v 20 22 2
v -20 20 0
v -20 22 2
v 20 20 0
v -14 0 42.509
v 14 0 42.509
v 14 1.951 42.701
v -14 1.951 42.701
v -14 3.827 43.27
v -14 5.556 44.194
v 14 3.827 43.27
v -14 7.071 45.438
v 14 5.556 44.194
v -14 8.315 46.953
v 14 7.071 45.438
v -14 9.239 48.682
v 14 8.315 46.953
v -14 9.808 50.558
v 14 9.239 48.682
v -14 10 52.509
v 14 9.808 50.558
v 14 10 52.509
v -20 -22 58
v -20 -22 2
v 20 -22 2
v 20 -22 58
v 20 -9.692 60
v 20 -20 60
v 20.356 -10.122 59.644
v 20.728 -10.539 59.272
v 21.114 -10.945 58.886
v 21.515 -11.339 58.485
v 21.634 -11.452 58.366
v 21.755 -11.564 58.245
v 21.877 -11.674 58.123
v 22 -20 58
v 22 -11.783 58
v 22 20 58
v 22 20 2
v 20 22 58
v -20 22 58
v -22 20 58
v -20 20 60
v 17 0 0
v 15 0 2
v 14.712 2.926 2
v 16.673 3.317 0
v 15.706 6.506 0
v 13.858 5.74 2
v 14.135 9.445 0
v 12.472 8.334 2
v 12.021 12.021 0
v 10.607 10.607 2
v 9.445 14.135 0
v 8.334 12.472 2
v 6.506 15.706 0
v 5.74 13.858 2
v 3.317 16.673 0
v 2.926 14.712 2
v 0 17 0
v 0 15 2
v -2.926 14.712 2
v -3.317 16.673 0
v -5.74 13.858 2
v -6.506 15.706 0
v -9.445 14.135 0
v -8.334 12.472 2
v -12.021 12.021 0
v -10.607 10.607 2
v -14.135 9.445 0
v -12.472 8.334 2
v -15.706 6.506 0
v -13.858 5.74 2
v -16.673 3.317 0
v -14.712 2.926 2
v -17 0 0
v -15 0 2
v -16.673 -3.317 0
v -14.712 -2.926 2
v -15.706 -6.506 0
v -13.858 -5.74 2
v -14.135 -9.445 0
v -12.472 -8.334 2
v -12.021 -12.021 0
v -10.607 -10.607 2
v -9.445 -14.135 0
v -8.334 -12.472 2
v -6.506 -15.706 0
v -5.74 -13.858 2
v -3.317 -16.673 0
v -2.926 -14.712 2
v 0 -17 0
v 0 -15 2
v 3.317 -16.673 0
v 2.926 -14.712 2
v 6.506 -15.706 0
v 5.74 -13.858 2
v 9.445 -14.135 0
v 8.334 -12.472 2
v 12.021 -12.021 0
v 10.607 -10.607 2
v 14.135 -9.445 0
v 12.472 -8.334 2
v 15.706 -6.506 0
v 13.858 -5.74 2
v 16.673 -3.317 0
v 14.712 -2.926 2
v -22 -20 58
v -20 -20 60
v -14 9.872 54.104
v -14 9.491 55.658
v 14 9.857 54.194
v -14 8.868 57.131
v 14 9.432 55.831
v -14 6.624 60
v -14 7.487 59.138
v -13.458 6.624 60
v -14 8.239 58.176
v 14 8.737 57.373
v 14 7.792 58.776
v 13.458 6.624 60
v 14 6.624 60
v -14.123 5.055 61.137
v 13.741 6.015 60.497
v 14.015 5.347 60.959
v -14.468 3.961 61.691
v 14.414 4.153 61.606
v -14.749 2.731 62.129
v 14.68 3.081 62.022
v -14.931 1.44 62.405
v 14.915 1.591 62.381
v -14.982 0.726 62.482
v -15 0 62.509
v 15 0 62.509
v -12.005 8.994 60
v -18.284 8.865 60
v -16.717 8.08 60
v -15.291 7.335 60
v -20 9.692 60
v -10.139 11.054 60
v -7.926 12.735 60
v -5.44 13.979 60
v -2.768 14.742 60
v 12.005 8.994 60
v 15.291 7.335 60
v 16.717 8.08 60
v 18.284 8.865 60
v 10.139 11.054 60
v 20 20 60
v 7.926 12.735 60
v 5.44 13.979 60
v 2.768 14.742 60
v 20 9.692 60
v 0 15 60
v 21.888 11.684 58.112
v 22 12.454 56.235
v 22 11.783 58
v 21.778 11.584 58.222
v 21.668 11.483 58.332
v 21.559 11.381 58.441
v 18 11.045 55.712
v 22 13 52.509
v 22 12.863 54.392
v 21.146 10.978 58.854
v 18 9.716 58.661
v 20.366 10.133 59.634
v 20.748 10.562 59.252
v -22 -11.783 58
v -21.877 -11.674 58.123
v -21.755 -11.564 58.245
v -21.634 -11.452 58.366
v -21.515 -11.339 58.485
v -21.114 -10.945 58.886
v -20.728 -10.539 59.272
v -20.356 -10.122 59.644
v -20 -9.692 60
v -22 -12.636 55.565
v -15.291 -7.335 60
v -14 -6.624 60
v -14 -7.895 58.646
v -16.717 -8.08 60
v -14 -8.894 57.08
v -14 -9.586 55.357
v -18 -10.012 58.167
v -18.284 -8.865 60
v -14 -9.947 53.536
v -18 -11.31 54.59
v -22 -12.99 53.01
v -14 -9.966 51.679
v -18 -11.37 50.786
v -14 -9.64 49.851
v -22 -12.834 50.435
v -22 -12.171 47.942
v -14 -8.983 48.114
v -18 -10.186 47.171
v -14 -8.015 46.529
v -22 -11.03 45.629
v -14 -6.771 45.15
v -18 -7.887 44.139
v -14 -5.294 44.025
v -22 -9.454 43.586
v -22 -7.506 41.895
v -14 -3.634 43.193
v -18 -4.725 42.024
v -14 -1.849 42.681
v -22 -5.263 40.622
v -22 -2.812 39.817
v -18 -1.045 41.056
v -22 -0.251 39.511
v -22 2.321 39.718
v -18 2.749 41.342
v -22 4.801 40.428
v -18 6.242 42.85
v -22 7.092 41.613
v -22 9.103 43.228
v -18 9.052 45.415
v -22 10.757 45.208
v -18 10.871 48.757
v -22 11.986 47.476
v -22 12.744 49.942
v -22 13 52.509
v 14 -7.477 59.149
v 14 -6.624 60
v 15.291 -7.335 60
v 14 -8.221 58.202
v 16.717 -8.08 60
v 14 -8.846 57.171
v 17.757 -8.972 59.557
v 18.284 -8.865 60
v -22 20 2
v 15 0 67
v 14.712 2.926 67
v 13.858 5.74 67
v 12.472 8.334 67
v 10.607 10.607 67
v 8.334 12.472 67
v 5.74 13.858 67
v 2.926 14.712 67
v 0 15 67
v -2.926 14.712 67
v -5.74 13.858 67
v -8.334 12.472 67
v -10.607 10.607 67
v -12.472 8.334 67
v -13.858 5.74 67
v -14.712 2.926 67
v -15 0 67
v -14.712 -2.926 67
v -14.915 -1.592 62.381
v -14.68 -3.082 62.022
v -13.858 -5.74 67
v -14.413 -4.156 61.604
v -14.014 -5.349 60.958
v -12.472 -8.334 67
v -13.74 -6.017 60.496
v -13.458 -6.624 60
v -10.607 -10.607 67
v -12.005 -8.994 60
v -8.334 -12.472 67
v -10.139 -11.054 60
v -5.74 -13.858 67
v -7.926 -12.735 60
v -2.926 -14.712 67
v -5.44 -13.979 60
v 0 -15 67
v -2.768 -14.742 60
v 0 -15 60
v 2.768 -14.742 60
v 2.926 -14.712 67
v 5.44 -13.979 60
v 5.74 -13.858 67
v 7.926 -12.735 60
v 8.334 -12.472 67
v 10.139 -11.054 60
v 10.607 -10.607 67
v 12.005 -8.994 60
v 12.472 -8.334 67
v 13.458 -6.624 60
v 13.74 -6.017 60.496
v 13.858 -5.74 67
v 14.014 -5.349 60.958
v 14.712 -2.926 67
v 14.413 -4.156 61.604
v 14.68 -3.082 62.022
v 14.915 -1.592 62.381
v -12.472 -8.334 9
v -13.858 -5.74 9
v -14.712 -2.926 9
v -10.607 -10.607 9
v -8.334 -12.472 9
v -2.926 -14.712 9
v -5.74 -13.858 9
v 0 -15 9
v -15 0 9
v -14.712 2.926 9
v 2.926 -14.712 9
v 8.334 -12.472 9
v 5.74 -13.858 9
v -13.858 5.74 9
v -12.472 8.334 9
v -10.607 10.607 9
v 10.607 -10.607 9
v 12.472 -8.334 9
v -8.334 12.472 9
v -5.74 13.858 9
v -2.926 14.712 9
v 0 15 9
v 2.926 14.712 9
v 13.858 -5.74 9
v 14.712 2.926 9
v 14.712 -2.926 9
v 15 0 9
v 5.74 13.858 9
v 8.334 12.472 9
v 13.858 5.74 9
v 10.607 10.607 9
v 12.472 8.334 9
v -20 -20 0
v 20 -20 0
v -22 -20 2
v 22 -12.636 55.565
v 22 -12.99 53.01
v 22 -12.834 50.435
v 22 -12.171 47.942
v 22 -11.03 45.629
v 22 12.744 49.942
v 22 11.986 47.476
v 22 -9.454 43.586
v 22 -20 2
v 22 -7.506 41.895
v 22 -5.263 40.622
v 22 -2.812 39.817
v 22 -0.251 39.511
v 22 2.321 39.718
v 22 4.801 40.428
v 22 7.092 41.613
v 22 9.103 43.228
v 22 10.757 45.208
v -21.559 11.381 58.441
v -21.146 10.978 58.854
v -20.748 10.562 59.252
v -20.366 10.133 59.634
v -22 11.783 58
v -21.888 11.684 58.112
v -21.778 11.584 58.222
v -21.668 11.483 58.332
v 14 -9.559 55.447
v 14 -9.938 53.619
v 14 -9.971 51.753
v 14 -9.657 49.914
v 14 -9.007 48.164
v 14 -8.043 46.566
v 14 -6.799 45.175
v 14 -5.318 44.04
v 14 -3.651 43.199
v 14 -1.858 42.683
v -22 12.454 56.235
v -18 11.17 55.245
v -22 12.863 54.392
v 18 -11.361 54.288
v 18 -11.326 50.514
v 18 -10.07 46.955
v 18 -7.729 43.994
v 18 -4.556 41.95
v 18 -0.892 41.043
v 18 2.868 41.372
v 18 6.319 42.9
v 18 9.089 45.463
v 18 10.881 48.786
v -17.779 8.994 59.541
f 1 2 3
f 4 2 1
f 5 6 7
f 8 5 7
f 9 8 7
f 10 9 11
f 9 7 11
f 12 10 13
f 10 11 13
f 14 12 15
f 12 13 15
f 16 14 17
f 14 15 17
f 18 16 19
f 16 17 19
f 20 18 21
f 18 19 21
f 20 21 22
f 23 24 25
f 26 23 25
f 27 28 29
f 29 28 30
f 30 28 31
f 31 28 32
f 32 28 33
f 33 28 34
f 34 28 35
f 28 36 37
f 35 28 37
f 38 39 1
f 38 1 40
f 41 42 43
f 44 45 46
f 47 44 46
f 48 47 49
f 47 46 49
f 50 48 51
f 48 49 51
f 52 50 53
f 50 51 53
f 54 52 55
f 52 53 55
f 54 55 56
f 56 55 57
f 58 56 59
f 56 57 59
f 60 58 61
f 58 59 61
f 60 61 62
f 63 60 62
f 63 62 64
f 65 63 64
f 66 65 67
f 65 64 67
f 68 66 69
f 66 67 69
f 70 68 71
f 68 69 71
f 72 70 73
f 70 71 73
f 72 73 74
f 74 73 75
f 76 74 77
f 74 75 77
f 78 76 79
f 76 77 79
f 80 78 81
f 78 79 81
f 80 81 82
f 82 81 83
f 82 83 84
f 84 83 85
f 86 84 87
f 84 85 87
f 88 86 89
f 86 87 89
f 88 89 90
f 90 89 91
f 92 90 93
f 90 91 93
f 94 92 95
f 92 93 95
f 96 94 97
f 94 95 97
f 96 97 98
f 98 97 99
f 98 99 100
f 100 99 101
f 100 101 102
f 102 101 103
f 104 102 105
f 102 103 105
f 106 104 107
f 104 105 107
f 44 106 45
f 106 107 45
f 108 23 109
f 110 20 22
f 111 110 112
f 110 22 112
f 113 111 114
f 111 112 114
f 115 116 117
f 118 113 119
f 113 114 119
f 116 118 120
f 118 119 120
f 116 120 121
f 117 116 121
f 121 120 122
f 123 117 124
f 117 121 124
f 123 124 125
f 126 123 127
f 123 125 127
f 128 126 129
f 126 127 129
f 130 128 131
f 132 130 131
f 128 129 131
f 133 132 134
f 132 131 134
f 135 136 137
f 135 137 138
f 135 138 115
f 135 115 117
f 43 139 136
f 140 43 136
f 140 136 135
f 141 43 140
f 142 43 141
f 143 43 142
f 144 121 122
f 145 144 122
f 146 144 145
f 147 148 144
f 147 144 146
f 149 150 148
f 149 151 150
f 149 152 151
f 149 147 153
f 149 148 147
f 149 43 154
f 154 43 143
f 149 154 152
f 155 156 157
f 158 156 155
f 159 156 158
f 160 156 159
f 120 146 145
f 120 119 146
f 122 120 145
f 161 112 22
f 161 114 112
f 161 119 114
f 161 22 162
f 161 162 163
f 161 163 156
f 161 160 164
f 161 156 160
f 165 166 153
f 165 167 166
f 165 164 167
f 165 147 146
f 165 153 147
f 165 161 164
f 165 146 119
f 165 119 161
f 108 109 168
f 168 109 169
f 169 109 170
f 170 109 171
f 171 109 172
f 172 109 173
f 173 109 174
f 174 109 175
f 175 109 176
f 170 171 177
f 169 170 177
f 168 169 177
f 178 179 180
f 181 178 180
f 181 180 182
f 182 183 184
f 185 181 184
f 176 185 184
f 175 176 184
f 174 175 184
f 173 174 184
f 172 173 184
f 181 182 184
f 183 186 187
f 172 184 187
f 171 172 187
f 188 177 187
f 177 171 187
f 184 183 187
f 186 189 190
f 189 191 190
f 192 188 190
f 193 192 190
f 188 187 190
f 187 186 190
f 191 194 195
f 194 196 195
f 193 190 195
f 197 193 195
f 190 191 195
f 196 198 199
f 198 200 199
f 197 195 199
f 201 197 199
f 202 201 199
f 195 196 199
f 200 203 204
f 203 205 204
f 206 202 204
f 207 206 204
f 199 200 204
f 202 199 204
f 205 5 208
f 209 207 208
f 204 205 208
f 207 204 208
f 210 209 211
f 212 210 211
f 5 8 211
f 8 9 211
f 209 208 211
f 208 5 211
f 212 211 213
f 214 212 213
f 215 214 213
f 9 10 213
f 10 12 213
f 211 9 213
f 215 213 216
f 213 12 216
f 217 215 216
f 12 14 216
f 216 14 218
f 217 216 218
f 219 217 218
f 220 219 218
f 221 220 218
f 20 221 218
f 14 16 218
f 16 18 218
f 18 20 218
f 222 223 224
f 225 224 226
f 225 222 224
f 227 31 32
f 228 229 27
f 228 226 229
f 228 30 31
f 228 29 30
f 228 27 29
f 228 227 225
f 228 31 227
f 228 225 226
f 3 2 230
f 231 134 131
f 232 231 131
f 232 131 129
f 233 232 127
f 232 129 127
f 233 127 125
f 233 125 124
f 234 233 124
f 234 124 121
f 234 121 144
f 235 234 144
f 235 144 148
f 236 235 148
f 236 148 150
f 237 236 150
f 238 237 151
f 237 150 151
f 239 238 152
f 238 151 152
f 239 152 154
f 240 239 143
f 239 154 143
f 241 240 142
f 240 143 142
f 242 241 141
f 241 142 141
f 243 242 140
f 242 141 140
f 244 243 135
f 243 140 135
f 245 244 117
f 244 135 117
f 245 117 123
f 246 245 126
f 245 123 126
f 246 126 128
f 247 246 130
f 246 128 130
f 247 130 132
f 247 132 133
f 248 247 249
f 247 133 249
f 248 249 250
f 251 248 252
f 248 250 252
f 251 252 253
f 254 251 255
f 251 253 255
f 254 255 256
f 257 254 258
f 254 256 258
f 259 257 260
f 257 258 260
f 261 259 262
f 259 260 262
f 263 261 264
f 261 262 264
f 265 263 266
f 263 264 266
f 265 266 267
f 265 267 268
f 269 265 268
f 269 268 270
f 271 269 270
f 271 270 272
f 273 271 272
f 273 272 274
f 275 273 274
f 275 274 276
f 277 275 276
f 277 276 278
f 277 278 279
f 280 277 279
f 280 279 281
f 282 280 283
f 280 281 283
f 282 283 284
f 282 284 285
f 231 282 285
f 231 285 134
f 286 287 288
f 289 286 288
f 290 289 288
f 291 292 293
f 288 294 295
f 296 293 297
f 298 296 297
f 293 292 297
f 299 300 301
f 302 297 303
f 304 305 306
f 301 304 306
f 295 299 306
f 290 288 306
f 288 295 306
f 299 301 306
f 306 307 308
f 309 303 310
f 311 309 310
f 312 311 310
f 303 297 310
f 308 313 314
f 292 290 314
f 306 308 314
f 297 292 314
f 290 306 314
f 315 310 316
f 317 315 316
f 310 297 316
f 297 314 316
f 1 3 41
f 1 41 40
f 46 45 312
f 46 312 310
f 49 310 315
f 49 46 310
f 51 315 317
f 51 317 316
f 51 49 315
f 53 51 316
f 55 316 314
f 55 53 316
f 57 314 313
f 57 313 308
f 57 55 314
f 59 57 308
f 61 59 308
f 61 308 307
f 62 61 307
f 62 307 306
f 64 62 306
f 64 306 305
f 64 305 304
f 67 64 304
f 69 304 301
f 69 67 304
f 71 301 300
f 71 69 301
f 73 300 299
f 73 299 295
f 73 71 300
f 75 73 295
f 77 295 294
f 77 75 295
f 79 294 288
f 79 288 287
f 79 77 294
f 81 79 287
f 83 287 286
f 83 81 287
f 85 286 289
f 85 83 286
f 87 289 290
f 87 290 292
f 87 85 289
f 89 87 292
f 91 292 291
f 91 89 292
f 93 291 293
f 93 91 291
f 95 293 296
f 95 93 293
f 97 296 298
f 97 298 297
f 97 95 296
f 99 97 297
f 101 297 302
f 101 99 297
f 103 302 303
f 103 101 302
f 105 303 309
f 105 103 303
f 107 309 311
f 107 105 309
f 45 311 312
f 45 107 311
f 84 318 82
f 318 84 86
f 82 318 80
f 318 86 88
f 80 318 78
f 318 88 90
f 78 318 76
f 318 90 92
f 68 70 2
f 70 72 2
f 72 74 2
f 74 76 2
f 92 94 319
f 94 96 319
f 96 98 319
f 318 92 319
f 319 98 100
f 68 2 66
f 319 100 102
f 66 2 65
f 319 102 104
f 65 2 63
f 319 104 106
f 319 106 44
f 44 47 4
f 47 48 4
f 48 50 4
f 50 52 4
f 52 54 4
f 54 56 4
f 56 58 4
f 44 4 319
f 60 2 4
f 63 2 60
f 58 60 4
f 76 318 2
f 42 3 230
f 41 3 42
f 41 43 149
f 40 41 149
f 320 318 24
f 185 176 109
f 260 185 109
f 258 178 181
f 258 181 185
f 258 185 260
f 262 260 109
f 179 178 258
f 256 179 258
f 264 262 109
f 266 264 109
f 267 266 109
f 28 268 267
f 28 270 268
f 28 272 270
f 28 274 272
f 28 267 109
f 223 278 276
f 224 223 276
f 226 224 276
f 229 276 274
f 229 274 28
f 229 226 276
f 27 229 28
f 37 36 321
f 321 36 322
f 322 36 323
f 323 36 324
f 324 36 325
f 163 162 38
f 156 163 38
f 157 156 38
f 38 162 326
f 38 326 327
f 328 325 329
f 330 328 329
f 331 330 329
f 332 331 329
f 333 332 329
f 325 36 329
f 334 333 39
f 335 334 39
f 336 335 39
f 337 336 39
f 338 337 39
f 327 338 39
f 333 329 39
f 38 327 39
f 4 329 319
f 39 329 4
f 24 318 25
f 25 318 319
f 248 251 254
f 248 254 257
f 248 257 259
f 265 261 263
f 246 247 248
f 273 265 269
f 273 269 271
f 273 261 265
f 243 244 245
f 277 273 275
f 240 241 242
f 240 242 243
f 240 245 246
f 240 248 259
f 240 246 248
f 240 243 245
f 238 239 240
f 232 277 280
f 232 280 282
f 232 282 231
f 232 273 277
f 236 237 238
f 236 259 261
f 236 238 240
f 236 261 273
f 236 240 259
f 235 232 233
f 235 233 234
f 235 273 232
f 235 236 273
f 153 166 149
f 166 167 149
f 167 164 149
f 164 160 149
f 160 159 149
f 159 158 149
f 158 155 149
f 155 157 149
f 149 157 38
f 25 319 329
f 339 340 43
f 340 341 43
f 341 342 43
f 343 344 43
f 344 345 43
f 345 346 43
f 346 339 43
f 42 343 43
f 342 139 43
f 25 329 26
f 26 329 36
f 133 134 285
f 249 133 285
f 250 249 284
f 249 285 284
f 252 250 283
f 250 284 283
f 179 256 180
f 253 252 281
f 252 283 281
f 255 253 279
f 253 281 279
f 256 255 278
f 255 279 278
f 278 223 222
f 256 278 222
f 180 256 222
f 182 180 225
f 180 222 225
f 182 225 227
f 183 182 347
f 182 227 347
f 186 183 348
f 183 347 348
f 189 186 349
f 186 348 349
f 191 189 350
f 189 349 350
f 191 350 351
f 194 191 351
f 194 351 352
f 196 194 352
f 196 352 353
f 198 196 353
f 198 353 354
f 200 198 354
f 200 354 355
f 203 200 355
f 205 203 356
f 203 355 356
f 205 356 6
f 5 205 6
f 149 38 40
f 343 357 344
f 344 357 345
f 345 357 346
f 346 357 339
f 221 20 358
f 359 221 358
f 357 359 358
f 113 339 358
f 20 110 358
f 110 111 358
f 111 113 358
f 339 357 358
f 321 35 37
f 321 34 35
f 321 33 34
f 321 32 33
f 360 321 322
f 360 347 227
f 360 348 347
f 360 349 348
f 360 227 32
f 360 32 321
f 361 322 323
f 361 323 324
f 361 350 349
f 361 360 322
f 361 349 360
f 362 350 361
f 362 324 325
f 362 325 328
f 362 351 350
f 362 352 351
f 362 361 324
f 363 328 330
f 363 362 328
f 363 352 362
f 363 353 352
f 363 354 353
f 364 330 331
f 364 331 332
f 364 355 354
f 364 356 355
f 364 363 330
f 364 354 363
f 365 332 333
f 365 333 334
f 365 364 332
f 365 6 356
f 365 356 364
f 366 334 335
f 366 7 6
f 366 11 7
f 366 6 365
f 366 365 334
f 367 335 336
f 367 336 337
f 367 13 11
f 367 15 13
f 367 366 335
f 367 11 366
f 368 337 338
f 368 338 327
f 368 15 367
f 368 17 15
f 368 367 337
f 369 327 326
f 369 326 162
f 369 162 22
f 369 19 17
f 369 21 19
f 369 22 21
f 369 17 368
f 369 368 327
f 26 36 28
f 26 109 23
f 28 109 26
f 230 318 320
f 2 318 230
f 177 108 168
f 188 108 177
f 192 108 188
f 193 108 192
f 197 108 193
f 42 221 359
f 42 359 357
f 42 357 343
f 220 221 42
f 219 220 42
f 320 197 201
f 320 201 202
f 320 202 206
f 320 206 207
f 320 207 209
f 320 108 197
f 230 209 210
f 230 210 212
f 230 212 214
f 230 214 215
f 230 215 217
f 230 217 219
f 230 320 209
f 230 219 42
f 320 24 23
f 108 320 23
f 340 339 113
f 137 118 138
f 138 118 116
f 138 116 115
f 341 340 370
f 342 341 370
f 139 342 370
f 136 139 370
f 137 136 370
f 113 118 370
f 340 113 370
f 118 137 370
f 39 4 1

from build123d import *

# Parameters (mm, degrees)
F2_W          = 44
F2_H          = 44
F2_R          = 15
F2_R_2        = 10
F3_DEPTH      = 60
F4_R          = 15
F4_R_2        = 10
F5_DEPTH      = 7
F6_DEPTH      = 9
F8_SIZE       = 2
F11_DEPTH     = 60
F12_T4_ANGLE  = 332.4696617
F12_T9_ANGLE  = 152.2075678766
F12_T14_ANGLE = 152.2075678766
F12_T19_ANGLE = 332.4696617


# Not quite as in the source:
# - a fillet or chamfer that OpenCascade refuses, or shapes differently, is made with other operations: its cross-section is extruded or revolved along the edge and cut away or added


with BuildPart() as f3:
    # F2 (on Top) → F3 (new body)
    with BuildSketch(Plane.XY):
        Rectangle(F2_W, F2_H)
        Circle(F2_R, mode=Mode.SUBTRACT)
        Circle(F2_R)
        Circle(F2_R_2, mode=Mode.SUBTRACT)
        Circle(F2_R_2)
    extrude(amount=F3_DEPTH)

    # F4 (on face) → F5 (join)
    with BuildSketch(Plane.XY.offset(60)):
        Circle(F4_R)
        Circle(F4_R_2, mode=Mode.SUBTRACT)
        Circle(F4_R_2)
    extrude(amount=F5_DEPTH)

    # F2 (on Top) → F6 (cut)
    with BuildSketch(Plane.XY):
        Circle(F2_R)
        Circle(F2_R_2, mode=Mode.SUBTRACT)
        Circle(F2_R_2)
    extrude(amount=F6_DEPTH, mode=Mode.SUBTRACT)

    # F8
    f8_edges = [f3.edges().sort_by_distance(p)[0] for p in [
        (0, -22, 0),
        (22, 0, 0),
        (-22, 0, 0),
        (0, 22, 0),
        (-22, -22, 30),
        (-22, 22, 30),
        (22, 22, 30),
        (22, -22, 30),
        (22, 0, 60),
        (0, -22, 60),
        (-22, 0, 60),
        (0, 22, 60),
        (-15, 0, 0),
    ]]
    chamfer(f8_edges, length=F8_SIZE)

    # F10 (on offset) → F11 (cut)
    with BuildSketch(Plane.YZ.offset(22)):
        with BuildLine():
            ThreePointArc((10, 52.5087859035), (7.0710678119, 59.5798537153), (0, 62.5087859035))
            Line((0, 62.5087859035), (0, 42.5087859035))
            ThreePointArc((0, 42.5087859035), (7.0710678119, 45.4377180916), (10, 52.5087859035))
        make_face()
        with BuildLine():
            Line((0, 42.5087859035), (0, 62.5087859035))
            ThreePointArc((0, 62.5087859035), (-10, 52.5087859035), (0, 42.5087859035))
        make_face()
    extrude(amount=-F11_DEPTH, mode=Mode.SUBTRACT)

    # F12: chamfer of 3 x 8 on 4 edges, made by hand


with BuildPart() as f12_tool2:
    # F12_s3 → F12_t4 (revolve)
    with BuildSketch(Plane(origin=(0, -21.5222750688, 41.2905103072), x_dir=(1, 0, 0), z_dir=(0, 0.4622182236, -0.8867662115))):
        Polygon((-22, -37.2705177426), (-14, -34.2705177426), (-22, -34.2705177426), align=None)
    revolve(axis=Axis((-22, 0, 52.5087859035), (1, 0, 0)), revolution_arc=F12_T4_ANGLE)

    split(bisect_by=Plane.XY.offset(60), keep=Keep.BOTTOM)


with BuildPart() as f3_1:
    add(f3.part)

    # F12_t1: cut F12_tool2
    add(f12_tool2.part, mode=Mode.SUBTRACT)


with BuildPart() as f12_tool7:
    # F12_s8 → F12_t9 (revolve)
    with BuildSketch(Plane.XY.offset(52.5087859035)):
        Polygon((-22, 13), (-14, 10), (-22, 10), align=None)
    revolve(axis=Axis((-22, 0, 52.5087859035), (1, 0, 0)), revolution_arc=F12_T9_ANGLE)

    split(bisect_by=Plane.XY.offset(60), keep=Keep.BOTTOM)


with BuildPart() as f3_2:
    add(f3_1.part)

    # F12_t6: cut F12_tool7
    add(f12_tool7.part, mode=Mode.SUBTRACT)


with BuildPart() as f12_tool12:
    # F12_s13 → F12_t14 (revolve)
    with BuildSketch(Plane.XY.offset(52.5087859035)):
        Polygon((22, 13), (14, 10), (22, 10), align=None)
    revolve(axis=Axis((22, 0, 52.5087859035), (1, 0, 0)), revolution_arc=F12_T14_ANGLE)

    split(bisect_by=Plane.XY.offset(60), keep=Keep.BOTTOM)


with BuildPart() as f3_3:
    add(f3_2.part)

    # F12_t11: cut F12_tool12
    add(f12_tool12.part, mode=Mode.SUBTRACT)


with BuildPart() as f12_tool17:
    # F12_s18 → F12_t19 (revolve)
    with BuildSketch(Plane(origin=(0, -21.5222750688, 41.2905103072), x_dir=(1, 0, 0), z_dir=(0, 0.4622182236, -0.8867662115))):
        Polygon((22, -37.2705177426), (14, -34.2705177426), (22, -34.2705177426), align=None)
    revolve(axis=Axis((22, 0, 52.5087859035), (1, 0, 0)), revolution_arc=F12_T19_ANGLE)

    split(bisect_by=Plane.XY.offset(60), keep=Keep.BOTTOM)


with BuildPart() as f3_4:
    add(f3_3.part)

    # F12_t16: cut F12_tool17
    add(f12_tool17.part, mode=Mode.SUBTRACT)


solid = f3_4.part
